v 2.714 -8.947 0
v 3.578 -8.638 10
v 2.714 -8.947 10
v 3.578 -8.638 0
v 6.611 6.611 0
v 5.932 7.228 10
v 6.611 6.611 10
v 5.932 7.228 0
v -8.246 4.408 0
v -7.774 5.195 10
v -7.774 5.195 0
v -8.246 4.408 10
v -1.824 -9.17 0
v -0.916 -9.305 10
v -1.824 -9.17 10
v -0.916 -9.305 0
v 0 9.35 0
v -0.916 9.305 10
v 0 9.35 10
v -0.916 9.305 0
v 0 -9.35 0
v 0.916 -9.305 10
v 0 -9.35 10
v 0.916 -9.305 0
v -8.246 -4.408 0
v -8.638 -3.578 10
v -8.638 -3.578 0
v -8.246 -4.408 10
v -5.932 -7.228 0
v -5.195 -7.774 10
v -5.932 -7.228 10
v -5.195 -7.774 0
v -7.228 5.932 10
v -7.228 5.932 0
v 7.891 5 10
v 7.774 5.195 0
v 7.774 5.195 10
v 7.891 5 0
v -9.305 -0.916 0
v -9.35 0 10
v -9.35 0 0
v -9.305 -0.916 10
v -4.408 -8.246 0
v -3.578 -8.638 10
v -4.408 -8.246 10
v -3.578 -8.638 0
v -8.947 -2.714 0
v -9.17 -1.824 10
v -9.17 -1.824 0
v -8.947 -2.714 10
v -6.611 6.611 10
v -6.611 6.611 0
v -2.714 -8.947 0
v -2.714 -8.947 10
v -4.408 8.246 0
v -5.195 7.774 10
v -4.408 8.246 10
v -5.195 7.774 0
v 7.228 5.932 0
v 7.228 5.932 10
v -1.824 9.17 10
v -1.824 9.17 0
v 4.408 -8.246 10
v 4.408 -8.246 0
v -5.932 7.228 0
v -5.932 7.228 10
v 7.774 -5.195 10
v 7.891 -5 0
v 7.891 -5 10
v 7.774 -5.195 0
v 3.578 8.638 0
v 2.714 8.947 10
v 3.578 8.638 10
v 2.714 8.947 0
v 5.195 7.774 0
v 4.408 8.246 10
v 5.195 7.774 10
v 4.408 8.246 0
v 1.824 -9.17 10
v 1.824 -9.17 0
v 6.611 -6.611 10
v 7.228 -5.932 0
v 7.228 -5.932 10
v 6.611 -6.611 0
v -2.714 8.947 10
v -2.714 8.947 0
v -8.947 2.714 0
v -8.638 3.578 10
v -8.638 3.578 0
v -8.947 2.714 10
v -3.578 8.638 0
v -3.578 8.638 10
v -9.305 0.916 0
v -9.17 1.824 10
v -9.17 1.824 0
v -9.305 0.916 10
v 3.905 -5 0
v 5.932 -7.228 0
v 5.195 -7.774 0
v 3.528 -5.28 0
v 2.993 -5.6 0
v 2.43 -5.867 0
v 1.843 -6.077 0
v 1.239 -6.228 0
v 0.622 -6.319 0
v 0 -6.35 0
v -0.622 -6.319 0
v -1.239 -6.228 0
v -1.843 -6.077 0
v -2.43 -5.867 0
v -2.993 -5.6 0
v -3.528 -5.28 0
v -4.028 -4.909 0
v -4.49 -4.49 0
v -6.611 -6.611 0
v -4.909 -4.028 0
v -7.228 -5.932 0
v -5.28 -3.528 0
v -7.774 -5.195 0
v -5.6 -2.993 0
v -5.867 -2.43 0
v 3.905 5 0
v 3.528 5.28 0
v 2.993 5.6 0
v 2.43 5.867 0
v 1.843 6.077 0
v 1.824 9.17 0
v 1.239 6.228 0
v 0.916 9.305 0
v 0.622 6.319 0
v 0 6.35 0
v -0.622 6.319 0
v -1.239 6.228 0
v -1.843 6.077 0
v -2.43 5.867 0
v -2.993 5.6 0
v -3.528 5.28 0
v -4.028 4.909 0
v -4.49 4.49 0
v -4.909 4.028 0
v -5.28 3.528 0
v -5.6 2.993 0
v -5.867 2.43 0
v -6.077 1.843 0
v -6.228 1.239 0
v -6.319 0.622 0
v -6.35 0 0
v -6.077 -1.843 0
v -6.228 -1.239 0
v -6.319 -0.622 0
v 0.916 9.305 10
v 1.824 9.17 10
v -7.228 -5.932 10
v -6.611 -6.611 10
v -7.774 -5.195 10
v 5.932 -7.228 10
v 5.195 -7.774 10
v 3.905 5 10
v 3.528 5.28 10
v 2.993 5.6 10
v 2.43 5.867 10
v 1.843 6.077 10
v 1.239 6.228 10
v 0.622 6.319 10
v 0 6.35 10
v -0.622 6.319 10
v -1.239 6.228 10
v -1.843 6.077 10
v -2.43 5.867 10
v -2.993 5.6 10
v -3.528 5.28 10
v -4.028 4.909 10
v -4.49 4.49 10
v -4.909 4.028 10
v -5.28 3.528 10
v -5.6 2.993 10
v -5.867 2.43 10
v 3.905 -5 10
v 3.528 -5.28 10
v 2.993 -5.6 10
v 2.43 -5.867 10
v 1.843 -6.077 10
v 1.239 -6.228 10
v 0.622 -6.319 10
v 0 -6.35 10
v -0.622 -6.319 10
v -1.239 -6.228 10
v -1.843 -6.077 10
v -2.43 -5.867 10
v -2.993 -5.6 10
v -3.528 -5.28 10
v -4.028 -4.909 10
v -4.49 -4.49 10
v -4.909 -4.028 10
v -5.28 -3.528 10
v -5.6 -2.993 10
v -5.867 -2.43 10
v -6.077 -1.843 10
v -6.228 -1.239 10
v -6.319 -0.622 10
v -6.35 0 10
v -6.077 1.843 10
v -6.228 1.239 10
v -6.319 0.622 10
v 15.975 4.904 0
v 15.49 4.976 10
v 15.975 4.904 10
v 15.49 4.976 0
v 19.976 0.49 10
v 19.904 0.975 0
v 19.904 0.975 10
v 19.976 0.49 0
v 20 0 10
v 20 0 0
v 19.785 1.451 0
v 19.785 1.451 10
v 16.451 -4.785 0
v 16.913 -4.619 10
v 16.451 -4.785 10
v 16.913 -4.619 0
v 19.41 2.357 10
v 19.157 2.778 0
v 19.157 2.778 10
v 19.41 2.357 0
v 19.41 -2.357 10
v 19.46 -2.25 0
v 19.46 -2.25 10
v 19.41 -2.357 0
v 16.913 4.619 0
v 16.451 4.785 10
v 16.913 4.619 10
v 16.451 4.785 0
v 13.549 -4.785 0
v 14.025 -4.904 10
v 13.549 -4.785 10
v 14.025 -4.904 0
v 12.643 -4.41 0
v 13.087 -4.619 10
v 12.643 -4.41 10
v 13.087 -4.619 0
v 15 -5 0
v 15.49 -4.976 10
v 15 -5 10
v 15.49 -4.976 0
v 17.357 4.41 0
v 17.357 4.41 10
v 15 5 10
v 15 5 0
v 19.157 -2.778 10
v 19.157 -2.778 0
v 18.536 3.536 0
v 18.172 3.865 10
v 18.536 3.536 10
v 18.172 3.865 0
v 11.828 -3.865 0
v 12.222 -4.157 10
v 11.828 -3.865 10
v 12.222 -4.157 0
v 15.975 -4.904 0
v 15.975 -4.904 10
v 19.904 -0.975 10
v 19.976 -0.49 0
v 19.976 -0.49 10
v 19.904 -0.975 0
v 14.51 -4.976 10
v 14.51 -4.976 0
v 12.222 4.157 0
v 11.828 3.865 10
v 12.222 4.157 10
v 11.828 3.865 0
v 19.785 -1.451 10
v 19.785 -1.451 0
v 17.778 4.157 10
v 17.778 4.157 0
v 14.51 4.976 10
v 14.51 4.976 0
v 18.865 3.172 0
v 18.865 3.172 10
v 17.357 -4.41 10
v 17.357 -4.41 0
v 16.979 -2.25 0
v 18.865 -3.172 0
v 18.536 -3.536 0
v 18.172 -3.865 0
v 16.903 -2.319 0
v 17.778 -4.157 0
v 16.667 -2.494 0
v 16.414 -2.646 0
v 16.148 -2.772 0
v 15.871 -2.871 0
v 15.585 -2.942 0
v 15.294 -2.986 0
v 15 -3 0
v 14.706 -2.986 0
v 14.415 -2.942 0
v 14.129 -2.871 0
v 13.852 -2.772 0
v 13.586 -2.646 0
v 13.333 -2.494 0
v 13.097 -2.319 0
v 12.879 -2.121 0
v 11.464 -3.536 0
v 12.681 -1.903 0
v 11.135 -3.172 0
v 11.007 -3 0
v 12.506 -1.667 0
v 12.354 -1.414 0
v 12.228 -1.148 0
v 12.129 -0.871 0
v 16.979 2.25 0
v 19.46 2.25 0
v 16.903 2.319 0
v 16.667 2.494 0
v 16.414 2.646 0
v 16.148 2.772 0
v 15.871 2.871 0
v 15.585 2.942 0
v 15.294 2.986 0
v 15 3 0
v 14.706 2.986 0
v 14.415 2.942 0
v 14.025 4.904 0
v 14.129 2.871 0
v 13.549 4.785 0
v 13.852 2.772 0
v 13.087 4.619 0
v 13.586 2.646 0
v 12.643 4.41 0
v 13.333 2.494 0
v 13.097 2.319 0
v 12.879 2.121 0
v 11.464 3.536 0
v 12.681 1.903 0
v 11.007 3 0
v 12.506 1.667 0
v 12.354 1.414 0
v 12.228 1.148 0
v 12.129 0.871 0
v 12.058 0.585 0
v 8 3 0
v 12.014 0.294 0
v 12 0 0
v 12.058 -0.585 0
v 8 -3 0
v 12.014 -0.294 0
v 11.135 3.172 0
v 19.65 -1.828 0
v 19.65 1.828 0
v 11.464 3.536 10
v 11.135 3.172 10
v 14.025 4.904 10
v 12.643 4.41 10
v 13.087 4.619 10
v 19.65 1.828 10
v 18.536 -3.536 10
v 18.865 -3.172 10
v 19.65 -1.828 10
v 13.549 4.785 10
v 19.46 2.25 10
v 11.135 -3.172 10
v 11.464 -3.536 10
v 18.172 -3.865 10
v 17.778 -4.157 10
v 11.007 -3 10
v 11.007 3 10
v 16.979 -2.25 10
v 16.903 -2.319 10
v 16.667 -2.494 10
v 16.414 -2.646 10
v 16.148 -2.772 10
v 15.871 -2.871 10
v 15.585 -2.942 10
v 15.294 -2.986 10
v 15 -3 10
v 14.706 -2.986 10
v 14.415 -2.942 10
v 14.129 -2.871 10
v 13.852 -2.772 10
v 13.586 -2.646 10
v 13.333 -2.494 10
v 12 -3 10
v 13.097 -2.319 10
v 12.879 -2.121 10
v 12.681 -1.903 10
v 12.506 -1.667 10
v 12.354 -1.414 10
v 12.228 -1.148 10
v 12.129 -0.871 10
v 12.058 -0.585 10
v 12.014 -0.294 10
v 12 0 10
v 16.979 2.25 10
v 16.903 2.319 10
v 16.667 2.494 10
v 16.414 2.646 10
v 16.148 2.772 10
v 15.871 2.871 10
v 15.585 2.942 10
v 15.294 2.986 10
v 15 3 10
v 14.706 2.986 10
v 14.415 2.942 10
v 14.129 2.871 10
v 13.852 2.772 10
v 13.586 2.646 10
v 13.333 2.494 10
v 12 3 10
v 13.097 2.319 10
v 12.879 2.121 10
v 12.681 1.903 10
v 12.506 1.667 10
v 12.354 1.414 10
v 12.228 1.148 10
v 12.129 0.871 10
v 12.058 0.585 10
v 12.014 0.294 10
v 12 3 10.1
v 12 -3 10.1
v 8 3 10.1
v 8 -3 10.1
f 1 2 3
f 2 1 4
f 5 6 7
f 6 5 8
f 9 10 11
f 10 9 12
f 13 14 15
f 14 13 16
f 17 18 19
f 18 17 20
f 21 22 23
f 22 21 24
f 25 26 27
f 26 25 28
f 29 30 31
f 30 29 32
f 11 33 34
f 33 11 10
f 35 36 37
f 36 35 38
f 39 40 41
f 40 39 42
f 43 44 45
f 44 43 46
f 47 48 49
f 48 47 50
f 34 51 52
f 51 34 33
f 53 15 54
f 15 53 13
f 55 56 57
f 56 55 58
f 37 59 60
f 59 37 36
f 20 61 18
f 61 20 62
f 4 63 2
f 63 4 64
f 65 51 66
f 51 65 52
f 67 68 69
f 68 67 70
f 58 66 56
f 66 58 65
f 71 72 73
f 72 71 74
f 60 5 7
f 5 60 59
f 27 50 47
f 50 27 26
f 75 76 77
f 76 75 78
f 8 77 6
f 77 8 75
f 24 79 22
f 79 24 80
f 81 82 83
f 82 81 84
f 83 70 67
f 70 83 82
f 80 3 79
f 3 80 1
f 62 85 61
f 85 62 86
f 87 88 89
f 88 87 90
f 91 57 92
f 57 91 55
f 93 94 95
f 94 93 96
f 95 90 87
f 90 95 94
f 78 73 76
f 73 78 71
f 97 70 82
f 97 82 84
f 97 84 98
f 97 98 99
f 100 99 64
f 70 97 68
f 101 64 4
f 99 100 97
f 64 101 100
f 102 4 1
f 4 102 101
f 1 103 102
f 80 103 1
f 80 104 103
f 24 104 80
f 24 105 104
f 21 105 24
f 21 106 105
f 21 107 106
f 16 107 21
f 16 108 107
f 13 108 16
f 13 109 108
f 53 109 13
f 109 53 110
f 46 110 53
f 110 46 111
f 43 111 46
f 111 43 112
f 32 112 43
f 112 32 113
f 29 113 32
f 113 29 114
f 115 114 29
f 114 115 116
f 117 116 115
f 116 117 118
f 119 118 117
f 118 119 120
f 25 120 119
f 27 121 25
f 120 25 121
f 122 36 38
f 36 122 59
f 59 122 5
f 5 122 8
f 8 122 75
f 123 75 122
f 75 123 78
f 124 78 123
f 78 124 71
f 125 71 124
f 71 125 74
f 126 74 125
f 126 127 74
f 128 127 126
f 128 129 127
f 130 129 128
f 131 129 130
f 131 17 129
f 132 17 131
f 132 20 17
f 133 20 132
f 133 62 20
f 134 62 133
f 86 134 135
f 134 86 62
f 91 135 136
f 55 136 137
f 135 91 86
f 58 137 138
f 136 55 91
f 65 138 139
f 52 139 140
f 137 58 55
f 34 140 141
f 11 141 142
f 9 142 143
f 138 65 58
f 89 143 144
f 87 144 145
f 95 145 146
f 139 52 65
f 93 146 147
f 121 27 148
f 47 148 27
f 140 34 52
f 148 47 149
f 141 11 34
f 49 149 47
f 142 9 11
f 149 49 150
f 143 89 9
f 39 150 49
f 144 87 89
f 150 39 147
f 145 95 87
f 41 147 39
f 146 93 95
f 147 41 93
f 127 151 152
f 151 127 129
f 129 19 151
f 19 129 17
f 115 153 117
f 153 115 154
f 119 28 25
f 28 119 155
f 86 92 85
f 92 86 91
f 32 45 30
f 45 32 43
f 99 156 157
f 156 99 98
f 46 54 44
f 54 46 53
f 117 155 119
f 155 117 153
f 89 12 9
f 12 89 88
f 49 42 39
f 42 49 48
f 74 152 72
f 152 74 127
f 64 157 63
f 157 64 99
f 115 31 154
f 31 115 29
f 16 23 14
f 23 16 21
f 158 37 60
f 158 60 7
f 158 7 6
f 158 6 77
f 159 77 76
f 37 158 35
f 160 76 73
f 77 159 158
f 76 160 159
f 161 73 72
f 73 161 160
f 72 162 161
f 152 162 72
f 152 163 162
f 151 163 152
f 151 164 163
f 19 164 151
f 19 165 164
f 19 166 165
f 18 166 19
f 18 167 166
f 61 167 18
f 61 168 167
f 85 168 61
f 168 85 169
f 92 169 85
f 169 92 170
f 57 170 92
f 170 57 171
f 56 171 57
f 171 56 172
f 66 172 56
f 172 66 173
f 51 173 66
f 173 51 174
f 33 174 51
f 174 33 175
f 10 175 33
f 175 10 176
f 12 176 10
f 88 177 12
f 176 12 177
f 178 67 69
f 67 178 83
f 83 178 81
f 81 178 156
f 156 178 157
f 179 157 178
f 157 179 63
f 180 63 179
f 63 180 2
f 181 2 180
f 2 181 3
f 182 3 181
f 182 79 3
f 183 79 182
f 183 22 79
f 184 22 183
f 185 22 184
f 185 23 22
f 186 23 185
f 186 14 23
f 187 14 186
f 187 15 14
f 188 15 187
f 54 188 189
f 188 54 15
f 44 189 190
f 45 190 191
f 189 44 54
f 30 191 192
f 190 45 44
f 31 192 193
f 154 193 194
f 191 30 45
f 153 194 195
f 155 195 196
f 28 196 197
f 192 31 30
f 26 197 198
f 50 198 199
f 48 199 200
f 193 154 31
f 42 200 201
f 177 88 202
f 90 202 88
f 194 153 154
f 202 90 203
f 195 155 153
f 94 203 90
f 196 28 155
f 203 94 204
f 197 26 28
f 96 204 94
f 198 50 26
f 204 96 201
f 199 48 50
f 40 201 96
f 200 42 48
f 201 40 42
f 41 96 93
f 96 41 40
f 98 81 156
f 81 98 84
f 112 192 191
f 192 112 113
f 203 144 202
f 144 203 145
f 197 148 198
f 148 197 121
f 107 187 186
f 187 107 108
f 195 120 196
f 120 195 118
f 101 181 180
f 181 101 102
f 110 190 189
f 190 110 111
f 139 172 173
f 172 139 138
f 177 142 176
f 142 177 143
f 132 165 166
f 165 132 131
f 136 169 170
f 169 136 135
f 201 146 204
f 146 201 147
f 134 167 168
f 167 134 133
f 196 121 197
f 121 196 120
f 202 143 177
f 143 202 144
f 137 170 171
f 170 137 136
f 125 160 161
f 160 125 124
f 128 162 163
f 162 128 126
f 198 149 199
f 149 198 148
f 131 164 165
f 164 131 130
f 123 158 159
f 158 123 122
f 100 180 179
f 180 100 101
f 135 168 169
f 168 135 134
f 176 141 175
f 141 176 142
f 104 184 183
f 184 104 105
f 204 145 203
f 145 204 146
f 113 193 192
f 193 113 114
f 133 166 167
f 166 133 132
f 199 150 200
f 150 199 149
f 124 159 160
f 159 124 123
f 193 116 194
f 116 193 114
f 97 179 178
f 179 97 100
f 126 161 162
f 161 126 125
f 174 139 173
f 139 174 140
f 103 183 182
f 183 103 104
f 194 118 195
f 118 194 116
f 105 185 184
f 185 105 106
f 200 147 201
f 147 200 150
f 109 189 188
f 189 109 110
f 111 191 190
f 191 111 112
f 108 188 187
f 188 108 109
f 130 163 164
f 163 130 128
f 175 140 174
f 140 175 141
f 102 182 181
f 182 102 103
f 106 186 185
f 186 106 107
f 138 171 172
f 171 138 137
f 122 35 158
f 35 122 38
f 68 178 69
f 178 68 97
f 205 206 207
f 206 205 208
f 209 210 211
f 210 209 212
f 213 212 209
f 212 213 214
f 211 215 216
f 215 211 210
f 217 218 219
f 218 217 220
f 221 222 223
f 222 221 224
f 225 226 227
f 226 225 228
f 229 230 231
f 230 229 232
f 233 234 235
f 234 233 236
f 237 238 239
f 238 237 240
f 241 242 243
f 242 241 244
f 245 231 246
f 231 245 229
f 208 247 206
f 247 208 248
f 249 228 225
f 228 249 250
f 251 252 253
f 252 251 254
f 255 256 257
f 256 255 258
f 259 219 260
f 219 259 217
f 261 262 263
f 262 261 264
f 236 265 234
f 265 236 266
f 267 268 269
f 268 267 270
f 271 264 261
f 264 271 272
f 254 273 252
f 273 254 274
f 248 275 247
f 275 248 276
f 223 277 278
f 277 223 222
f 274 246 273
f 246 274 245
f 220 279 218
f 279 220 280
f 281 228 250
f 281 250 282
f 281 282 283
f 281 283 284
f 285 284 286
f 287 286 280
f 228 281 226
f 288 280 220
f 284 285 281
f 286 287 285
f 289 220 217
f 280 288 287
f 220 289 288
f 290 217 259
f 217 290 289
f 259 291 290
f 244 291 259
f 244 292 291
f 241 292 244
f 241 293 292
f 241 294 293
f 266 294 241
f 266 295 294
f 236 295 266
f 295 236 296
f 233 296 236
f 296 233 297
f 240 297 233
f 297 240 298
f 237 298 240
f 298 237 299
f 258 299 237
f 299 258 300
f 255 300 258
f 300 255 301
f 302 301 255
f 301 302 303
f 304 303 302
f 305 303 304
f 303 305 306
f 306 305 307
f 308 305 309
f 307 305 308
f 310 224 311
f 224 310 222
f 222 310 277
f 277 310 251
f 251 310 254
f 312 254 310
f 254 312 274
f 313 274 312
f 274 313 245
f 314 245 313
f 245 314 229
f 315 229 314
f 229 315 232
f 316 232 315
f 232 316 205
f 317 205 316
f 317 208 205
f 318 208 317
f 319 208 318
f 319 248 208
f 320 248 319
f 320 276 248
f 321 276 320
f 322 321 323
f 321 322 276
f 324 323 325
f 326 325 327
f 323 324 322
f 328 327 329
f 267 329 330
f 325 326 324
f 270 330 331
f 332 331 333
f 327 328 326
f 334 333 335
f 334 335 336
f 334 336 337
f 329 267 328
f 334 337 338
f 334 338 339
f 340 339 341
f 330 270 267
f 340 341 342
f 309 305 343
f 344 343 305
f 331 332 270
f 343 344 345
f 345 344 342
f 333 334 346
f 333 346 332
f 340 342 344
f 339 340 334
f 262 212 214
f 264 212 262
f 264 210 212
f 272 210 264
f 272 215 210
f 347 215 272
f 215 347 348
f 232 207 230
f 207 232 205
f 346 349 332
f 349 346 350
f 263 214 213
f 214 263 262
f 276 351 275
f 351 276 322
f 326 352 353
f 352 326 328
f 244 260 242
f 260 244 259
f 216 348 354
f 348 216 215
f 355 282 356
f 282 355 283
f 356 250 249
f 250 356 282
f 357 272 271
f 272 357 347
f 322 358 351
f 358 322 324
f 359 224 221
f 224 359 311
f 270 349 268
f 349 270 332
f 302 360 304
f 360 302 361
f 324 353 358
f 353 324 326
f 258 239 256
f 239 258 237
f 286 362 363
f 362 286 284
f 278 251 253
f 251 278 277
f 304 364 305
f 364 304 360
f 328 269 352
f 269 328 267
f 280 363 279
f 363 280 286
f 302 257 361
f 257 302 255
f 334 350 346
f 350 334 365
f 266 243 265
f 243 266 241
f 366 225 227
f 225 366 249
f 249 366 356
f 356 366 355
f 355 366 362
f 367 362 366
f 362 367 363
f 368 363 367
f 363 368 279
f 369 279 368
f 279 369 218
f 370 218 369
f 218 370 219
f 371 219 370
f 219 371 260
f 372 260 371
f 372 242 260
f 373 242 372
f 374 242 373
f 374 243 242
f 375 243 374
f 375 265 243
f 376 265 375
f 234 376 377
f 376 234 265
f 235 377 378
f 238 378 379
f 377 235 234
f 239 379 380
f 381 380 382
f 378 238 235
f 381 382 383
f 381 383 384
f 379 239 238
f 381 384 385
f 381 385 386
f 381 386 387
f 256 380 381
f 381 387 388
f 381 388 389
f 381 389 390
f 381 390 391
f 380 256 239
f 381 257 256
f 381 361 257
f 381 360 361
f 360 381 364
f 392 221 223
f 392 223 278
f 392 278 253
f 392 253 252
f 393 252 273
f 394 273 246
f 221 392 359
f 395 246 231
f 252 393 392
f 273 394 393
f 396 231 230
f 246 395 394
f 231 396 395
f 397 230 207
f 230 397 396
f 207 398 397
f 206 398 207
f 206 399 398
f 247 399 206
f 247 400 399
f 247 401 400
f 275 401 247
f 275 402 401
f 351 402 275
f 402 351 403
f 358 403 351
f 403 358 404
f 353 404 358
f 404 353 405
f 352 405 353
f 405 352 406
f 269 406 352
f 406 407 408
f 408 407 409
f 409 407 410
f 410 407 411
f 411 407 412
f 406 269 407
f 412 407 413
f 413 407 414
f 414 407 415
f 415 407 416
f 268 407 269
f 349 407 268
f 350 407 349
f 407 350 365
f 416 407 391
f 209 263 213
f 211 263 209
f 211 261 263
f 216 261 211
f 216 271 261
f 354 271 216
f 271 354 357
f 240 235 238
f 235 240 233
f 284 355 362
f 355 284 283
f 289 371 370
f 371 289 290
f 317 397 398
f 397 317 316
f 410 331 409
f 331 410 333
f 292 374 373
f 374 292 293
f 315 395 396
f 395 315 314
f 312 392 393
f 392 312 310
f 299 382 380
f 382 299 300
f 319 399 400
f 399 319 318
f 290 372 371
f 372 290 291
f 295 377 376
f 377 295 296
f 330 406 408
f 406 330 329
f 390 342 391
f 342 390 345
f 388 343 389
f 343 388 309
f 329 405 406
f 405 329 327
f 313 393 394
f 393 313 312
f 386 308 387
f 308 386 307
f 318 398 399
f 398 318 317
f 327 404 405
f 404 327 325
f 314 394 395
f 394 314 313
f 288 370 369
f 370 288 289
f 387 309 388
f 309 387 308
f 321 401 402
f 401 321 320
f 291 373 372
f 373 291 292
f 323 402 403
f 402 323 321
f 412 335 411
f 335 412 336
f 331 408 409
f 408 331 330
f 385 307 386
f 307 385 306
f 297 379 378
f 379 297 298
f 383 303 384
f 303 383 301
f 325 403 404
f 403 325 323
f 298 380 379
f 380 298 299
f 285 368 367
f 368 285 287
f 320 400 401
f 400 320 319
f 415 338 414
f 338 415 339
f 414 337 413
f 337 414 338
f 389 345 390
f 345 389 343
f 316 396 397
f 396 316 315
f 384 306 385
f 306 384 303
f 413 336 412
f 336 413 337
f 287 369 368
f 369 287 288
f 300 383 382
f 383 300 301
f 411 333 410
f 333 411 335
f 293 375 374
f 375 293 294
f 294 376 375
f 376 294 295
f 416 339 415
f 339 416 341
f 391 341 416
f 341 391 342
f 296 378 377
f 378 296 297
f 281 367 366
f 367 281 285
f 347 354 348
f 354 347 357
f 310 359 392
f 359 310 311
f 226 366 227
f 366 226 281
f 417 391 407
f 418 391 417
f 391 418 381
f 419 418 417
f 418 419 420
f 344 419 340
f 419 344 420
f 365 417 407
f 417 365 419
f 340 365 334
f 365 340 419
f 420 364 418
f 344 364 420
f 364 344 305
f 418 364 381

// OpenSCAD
// Snap-on Clip for Lab Stand Rod and Tubing
// Orientation: Flat on XY plane, building up in +Z.
// Units: Millimetres.

// --- Dimensions ---
// Rod Ring
$rod_id = 12.7;      // Inner diameter (mm)
$rod_wall = 3.0;     // Wall thickness (mm)
$rod_od = $rod_id + 2 * $rod_wall; // Outer diameter (mm)
$rod_z = 10.0;       // Height of extrusion (mm)

// Tubing Ring
$tube_id = 6.0;      // Inner diameter (mm)
$tube_wall = 2.0;    // Wall thickness (mm)
$tube_od = $tube_id + 2 * $tube_wall; // Outer diameter (mm)
$tube_x = 15.0;      // Center X position (mm)

// Bridge
$bridge_width = 6.0; // Width in Y (mm)
$bridge_x_start = 8.0; // Start X (mm)
$bridge_x_end = 12.0;  // End X (mm)

// Cutouts (Openings)
// Rod Ring Cutout: -X side, width 10mm, centered at y=0
$rod_cut_width = 10.0;
$rod_cut_y_half = $rod_cut_width / 2;

// Tubing Ring Cutout: +X side, width 4.5mm, centered at y=0
$tube_cut_width = 4.5;
$tube_cut_y_half = $tube_cut_width / 2;

// --- Geometry Construction ---

module rod_ring() {
    // Main ring body
    difference() {
        // Outer ring
        translate([0, 0, 0])
            cylinder(h = $rod_z, d = $rod_od, $fn = 64);
        
        // Inner hole
        translate([0, 0, 0])
            cylinder(h = $rod_z + 0.1, d = $rod_id, $fn = 64);
        
        // Cutout on -X side
        // We subtract a block that covers the area x < 0 and -5 < y < 5
        // Extending slightly past the faces to ensure clean cut
        translate([-0.05, -$rod_cut_y_half, 0])
            cube([
                $rod_cut_width + 0.1, // Width in X
                $rod_cut_width,       // Width in Y
                $rod_z + 0.1          // Height
            ]);
    }
}

module tube_ring() {
    // Main ring body
    difference() {
        // Outer ring
        translate([0, 0, 0])
            cylinder(h = $rod_z, d = $tube_od, $fn = 64);
        
        // Inner hole
        translate([0, 0, 0])
            cylinder(h = $rod_z + 0.1, d = $tube_id, $fn = 64);
        
        // Cutout on +X side
        // We subtract a block that covers the area x > 0 (relative to center) and -2.25 < y < 2.25
        translate([0.05, -$tube_cut_y_half, 0])
            cube([
                $tube_cut_width + 0.1, // Width in X
                $tube_cut_width,       // Width in Y
                $rod_z + 0.1           // Height
            ]);
    }
}

module bridge() {
    // Solid bridge connecting the two rings
    // Dimensions: 6mm wide in Y, spanning from x=8 to x=12
    translate([0, -$bridge_width/2, 0])
        cube([
            $bridge_x_end - $bridge_x_start, // Width in X
            $bridge_width,                   // Width in Y
            $rod_z + 0.1                     // Height
        ]);
}

// --- Final Assembly ---

difference() {
    union() {
        // 1. Rod Ring (Centered at origin)
        translate([0, 0, 0])
            rod_ring();
        
        // 2. Tubing Ring (Centered at x=15)
        translate([$tube_x, 0, 0])
            tube_ring();
        
        // 3. Bridge
        translate([$bridge_x_start, 0, 0])
            bridge();
    }
    
    // Optional: Add a small support nub if needed for printing stability, 
    // but the prompt implies a simple profile extrusion. 
    // The profile itself is the part.
}
